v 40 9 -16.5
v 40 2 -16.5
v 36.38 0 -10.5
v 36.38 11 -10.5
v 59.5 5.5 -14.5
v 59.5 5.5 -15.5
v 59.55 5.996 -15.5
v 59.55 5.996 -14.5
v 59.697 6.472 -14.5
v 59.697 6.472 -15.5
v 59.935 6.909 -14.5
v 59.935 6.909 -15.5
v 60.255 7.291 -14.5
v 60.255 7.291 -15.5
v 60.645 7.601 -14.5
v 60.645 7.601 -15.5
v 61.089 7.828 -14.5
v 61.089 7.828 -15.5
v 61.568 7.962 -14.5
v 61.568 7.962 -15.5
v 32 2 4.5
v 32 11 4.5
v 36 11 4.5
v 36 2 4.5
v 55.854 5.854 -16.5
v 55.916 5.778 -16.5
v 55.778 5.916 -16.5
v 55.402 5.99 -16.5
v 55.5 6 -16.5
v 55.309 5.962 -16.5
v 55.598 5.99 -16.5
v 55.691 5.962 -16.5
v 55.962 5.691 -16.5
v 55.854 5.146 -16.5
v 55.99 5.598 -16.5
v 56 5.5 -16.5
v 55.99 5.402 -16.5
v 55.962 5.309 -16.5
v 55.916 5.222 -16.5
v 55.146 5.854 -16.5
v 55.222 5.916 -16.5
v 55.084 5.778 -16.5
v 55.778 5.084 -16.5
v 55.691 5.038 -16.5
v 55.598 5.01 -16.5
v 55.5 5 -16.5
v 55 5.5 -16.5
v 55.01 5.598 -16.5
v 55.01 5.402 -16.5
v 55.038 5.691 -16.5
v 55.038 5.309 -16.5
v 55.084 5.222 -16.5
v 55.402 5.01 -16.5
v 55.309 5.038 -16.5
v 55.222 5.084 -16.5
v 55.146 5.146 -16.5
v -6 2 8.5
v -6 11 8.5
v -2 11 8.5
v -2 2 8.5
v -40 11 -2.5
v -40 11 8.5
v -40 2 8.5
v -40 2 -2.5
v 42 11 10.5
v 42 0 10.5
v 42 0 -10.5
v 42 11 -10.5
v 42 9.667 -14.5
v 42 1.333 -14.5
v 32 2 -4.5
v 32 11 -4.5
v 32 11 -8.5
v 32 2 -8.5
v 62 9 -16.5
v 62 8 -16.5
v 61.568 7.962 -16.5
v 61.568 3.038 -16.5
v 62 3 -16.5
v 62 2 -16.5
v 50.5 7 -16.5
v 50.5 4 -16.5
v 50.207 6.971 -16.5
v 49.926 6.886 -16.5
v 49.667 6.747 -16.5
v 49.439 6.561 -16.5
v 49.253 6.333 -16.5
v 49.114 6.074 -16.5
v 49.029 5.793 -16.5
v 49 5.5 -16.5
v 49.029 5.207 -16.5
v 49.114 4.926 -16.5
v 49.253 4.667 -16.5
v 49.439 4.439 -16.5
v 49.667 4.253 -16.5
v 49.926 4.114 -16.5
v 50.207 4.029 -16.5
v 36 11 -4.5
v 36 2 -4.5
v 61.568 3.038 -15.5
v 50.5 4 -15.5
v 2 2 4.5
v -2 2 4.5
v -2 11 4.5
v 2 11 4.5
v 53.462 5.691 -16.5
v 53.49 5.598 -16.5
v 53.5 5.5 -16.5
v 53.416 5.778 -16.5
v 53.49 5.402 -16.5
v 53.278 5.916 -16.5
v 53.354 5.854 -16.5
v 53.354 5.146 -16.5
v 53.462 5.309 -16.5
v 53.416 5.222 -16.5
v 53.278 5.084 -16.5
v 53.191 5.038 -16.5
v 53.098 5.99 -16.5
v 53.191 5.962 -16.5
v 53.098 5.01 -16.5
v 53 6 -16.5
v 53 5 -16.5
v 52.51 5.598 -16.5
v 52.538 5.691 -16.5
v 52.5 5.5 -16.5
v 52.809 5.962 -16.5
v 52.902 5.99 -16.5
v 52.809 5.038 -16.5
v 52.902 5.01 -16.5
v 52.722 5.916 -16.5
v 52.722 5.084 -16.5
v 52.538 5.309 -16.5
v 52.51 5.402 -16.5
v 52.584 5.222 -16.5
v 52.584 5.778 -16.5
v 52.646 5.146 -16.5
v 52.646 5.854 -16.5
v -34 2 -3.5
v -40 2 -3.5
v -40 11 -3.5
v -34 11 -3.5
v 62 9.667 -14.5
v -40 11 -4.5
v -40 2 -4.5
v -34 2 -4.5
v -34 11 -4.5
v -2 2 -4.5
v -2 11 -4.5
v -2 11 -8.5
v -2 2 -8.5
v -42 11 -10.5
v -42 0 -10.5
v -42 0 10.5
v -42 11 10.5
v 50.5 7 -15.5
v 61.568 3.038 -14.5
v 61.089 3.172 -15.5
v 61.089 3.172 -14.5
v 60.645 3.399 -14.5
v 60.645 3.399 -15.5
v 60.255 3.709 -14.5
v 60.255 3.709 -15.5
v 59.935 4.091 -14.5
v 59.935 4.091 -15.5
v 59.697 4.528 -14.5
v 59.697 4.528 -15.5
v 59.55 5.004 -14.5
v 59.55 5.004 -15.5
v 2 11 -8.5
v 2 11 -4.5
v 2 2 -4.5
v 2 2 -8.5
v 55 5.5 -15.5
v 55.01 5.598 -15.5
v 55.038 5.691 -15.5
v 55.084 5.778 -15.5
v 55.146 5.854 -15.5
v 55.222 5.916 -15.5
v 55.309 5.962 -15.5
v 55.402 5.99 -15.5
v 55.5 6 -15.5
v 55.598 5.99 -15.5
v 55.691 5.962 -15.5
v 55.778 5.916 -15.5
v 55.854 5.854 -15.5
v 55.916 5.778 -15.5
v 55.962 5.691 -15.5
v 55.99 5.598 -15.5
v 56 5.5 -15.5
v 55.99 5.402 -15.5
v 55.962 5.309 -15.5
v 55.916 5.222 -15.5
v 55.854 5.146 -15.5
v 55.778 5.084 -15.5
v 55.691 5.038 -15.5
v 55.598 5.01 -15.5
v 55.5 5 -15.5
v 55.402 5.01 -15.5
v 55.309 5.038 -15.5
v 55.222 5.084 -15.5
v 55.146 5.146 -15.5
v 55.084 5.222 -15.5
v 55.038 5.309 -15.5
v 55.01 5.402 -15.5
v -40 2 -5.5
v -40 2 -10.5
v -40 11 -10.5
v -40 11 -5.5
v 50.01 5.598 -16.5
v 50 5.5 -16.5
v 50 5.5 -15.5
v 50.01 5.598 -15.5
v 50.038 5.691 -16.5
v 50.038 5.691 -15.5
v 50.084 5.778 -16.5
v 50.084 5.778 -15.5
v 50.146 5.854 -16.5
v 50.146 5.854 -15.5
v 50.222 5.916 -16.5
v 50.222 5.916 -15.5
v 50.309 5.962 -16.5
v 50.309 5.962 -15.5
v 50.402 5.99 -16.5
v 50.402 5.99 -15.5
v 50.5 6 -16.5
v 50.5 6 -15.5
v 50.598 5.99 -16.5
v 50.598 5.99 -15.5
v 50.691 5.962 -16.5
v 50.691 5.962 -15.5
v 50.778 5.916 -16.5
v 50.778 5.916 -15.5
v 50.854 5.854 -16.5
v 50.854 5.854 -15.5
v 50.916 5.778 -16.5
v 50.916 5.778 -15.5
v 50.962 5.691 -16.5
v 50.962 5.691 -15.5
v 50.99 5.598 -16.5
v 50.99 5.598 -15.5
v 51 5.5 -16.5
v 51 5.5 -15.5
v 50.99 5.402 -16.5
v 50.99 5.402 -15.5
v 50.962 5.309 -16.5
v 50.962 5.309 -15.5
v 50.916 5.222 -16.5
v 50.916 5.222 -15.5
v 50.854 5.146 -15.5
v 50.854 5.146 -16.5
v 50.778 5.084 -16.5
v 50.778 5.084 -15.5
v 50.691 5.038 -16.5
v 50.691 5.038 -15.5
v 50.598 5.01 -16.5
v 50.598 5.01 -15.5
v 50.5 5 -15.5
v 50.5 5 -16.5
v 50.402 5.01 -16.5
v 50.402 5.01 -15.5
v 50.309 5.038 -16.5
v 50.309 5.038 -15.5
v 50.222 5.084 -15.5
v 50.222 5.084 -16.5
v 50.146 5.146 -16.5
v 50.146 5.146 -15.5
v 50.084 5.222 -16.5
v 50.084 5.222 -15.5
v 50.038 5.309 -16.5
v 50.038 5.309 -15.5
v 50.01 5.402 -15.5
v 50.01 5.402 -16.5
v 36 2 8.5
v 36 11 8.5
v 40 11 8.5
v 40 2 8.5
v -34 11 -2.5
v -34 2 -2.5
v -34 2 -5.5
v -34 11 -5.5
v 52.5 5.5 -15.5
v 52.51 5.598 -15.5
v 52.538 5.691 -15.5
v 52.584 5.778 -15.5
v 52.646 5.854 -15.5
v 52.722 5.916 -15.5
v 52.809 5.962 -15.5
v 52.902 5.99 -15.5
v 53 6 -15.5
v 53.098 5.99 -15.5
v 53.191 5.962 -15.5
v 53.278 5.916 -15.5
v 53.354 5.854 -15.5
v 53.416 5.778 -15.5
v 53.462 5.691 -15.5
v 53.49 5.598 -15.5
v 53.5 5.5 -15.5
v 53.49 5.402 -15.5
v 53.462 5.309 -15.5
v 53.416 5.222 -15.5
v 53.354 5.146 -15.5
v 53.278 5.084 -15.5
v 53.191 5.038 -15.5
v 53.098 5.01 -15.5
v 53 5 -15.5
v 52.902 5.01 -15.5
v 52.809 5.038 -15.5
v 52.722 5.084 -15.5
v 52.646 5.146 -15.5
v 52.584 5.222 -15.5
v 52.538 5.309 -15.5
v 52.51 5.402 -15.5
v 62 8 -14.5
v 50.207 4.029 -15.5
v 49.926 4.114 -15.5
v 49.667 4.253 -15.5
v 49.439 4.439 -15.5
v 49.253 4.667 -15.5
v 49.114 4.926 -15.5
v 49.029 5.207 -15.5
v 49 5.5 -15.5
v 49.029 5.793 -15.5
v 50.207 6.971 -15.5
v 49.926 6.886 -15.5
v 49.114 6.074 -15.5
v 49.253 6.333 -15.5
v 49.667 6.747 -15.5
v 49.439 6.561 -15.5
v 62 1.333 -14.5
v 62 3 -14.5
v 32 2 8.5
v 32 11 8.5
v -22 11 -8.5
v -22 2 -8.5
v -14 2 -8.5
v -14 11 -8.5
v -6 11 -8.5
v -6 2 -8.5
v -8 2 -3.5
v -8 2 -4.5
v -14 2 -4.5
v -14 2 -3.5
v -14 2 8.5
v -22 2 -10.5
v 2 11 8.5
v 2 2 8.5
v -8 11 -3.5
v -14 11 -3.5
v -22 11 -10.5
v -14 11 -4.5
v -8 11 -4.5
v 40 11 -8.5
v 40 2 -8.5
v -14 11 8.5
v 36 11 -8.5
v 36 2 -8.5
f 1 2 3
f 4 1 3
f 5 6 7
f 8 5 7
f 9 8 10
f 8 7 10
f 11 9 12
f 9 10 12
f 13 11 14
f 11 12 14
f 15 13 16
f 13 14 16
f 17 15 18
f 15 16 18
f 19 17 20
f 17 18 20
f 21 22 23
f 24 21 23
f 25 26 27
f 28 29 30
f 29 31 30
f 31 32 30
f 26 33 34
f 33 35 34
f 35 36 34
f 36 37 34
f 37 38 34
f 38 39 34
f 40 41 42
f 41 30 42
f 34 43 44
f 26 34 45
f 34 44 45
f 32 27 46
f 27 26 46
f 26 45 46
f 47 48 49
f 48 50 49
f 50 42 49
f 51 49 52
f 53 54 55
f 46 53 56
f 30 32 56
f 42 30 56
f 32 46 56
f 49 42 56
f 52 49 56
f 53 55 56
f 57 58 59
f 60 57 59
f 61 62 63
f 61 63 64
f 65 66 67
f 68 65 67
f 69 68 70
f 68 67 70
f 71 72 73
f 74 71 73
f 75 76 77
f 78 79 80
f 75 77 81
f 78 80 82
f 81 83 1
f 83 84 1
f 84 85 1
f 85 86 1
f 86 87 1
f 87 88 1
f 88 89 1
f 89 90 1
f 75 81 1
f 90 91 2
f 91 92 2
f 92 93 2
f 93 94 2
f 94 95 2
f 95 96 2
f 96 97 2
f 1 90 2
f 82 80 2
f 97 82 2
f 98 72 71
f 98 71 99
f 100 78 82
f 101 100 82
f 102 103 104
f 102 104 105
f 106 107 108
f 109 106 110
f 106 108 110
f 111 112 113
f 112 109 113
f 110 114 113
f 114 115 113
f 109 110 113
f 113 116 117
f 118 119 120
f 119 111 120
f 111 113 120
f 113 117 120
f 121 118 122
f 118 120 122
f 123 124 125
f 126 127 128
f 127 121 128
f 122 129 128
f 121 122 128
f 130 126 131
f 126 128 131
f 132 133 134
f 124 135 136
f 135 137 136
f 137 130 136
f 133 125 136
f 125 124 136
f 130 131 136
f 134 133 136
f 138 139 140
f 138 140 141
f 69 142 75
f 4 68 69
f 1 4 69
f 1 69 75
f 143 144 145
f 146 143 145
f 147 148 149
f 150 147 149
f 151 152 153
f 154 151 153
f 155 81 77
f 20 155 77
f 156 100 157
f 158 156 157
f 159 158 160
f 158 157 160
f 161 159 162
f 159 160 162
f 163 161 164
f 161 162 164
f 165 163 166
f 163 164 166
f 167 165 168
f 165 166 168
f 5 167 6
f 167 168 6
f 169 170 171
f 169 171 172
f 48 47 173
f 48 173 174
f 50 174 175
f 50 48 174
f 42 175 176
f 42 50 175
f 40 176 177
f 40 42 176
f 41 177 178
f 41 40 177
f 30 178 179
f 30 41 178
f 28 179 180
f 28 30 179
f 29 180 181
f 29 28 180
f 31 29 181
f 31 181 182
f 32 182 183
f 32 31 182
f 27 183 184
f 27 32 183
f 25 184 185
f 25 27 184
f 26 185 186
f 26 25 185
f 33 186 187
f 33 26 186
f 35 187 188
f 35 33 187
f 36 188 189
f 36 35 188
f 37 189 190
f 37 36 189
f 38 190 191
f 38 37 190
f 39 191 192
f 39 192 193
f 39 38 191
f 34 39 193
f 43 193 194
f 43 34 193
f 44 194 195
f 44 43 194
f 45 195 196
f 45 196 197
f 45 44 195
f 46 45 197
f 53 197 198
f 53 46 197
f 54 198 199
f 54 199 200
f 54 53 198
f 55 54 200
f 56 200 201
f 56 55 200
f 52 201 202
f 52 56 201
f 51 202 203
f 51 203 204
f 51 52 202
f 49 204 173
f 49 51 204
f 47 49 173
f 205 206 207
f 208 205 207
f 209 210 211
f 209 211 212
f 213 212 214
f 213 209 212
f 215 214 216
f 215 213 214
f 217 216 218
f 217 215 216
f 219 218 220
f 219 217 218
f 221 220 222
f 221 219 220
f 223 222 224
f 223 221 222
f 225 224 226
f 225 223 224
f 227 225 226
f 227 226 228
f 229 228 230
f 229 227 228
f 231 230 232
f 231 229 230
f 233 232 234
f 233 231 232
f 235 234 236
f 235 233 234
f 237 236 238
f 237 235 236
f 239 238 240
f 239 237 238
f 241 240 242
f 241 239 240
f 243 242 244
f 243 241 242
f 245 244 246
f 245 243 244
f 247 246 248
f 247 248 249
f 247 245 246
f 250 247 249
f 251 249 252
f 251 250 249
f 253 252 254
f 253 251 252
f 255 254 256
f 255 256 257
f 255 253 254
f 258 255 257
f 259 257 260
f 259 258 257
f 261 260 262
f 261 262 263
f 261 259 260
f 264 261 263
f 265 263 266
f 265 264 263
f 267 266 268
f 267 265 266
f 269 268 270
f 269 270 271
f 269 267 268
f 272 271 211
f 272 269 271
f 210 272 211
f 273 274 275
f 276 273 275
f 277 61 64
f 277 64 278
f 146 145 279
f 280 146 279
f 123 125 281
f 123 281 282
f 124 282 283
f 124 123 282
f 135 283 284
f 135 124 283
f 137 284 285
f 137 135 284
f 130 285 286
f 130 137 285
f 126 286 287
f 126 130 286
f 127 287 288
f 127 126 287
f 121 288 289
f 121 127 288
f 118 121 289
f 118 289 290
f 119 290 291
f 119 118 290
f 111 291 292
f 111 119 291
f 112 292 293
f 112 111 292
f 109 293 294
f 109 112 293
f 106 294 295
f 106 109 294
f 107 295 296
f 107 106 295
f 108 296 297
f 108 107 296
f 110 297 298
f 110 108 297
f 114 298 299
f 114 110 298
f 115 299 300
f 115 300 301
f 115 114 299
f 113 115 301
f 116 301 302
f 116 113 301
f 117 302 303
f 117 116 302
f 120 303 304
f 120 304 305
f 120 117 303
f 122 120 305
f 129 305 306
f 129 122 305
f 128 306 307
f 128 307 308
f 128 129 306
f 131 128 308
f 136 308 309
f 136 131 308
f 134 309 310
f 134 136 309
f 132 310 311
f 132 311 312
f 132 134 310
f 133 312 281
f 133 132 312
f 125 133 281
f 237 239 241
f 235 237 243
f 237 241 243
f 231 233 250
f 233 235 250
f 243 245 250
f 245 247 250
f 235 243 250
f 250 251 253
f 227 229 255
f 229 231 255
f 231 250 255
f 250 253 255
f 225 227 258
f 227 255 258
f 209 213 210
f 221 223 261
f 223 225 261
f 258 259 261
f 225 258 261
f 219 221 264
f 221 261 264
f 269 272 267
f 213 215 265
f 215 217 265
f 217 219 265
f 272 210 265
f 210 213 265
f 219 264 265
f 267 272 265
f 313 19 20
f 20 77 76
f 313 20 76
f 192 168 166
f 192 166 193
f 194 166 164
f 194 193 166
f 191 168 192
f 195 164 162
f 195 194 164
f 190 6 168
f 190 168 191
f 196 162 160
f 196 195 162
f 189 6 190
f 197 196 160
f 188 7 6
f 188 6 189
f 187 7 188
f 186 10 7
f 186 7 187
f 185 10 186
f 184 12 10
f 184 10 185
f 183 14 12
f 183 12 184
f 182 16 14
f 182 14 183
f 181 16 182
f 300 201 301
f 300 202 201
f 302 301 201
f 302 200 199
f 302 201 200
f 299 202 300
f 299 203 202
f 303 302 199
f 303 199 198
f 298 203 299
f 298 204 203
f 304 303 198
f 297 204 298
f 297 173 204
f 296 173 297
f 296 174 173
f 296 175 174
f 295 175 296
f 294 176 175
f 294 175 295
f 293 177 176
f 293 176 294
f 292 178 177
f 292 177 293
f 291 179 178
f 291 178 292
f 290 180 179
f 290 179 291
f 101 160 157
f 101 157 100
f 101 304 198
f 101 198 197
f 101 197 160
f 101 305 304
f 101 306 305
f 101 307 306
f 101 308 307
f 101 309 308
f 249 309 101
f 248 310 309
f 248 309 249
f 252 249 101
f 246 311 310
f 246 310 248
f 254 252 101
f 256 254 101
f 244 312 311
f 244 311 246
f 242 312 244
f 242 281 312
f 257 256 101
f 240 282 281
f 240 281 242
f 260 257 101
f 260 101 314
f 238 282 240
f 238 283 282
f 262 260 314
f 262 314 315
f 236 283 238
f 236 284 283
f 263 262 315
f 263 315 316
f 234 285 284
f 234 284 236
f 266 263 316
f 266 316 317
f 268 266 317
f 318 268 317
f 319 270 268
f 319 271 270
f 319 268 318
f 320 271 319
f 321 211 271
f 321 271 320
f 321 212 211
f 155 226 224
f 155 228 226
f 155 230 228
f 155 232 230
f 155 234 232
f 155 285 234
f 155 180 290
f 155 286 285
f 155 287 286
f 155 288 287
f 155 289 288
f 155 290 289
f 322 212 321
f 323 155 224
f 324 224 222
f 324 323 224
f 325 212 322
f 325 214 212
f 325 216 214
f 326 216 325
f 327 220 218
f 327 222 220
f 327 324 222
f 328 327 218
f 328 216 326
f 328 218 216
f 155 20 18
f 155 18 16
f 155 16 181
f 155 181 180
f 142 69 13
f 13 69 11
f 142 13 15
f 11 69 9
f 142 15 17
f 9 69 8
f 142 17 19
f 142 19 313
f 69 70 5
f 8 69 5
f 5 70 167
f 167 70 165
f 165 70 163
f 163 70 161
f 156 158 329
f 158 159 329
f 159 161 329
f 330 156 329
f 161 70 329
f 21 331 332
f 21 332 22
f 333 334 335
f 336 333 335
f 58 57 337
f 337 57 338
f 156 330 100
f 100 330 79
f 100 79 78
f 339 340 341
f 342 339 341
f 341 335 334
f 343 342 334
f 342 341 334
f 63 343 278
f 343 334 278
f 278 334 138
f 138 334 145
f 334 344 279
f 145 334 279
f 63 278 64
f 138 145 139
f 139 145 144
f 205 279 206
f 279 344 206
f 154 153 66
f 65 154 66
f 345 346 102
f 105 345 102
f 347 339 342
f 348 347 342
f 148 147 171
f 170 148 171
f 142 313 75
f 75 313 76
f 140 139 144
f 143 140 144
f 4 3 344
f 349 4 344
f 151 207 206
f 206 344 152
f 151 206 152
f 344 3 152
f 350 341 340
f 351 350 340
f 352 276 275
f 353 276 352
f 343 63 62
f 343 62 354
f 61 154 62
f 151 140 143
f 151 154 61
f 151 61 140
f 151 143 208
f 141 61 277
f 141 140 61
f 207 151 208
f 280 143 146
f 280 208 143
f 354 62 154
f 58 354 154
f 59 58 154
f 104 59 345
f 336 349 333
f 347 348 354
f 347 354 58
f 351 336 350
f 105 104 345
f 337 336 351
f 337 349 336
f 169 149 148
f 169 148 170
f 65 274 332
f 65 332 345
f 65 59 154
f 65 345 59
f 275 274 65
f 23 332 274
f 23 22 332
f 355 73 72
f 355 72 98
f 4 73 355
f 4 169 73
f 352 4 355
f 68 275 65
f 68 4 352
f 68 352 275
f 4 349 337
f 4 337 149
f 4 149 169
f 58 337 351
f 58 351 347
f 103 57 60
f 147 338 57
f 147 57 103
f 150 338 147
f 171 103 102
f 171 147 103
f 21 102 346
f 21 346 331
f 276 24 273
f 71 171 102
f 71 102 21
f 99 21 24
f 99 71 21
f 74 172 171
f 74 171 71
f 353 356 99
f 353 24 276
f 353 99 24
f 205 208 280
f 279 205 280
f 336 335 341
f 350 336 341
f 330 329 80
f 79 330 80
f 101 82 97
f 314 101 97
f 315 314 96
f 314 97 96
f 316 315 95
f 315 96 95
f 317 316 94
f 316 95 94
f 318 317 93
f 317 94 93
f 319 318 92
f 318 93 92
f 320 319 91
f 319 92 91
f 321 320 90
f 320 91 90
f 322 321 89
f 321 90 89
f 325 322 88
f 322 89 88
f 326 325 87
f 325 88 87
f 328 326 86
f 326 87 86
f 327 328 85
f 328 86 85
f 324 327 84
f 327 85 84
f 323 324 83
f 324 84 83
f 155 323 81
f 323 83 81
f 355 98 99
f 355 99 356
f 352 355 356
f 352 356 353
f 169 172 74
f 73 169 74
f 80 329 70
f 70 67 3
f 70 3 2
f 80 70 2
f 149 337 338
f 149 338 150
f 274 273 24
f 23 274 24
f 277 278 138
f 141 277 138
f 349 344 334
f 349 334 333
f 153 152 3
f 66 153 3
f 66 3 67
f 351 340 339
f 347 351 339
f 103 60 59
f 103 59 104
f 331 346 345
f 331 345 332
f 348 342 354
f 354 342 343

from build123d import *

# Parameters (mm, degrees)
BOSS_EXTRUDE1_DEPTH     = 2
SKETCH1_4_W             = 46
SKETCH1_4_H             = 17
BOSS_EXTRUDE2_DEPTH     = 11
SKETCH2_W               = 6
SKETCH2_H               = 3
SKETCH2_H_2             = 11
CUT_EXTRUDE1_DEPTH      = 9
SKETCH3_W               = 18
SKETCH3_H               = 9
CUT_EXTRUDE2_DEPTH      = 2
SKETCH4_W               = 4
SKETCH4_H               = 4
BOSS_EXTRUDE3_DEPTH     = 9
SKETCH6_R               = 0.5
CUT_EXTRUDE3_DEPTH      = 1
CUT_EXTRUDE4_DEPTH      = 2
CUT_EXTRUDE5_DEPTH      = 34
CUT_EXTRUDE5_DEPTH_BACK = 13


with BuildPart() as part:
    # Sketch1 → Boss-Extrude1 (new body)
    with BuildSketch(Plane(origin=(0, 0, 0), x_dir=(1, 0, 0), z_dir=(0, 1, 0))):
        Polygon((-42, 10.5), (-42, -10.5), (42, -10.5), (42, 14.5), (62, 14.5), (62, 16.5), (40, 16.5), (36.380121198, 10.5), align=None)
    extrude(amount=BOSS_EXTRUDE1_DEPTH)

    # Sketch1<4> → Boss-Extrude2 (add)
    with BuildSketch(Plane(origin=(0, 0, 0), x_dir=(1, 0, 0), z_dir=(0, 1, 0))):
        Polygon((-42, 10.5), (-42, -10.5), (42, -10.5), (42, 14.5), (62, 14.5), (62, 16.5), (40, 16.5), (36.380121198, 10.5), align=None)
        Polygon((-14, 3.5), (-14, -8.5), (-34, -8.5), (-34, 3.5), (-40, 3.5), (-40, 4.5), (-34, 4.5), (-34, 8.5), (-14, 8.5), (-14, 4.5), (-8, 4.5), (-8, 3.5), align=None, mode=Mode.SUBTRACT)
        with Locations((17, 0)):
            Rectangle(SKETCH1_4_W, SKETCH1_4_H, mode=Mode.SUBTRACT)
    extrude(amount=BOSS_EXTRUDE2_DEPTH)

    # Sketch2 → Cut-Extrude1 (cut)
    with BuildSketch(Plane(origin=(0, 11, 0), x_dir=(1, 0, 0), z_dir=(0, 1, 0))):
        with Locations((-37, 7)):
            Rectangle(SKETCH2_W, SKETCH2_H)
        with Locations((-37, -3)):
            Rectangle(SKETCH2_W, SKETCH2_H_2)
    extrude(amount=-CUT_EXTRUDE1_DEPTH, mode=Mode.SUBTRACT)

    # Sketch3 → Cut-Extrude2 (cut)
    with BuildSketch(Plane(origin=(0, 0, -10.5), x_dir=(-1, 0, 0), z_dir=(0, 0, -1))):
        with Locations((31, 6.5)):
            Rectangle(SKETCH3_W, SKETCH3_H)
    extrude(amount=-CUT_EXTRUDE2_DEPTH, mode=Mode.SUBTRACT)

    # Sketch4 → Boss-Extrude3 (add)
    with BuildSketch(Plane(origin=(0, 2, 0), x_dir=(1, 0, 0), z_dir=(0, 1, 0))):
        with Locations((0, 6.5)):
            Rectangle(SKETCH4_W, SKETCH4_H)
        with Locations((0, -6.5)):
            Rectangle(SKETCH4_W, SKETCH4_H)
        with Locations((34, 6.5)):
            Rectangle(SKETCH4_W, SKETCH4_H)
        with Locations((34, -6.5)):
            Rectangle(SKETCH4_W, SKETCH4_H)
    extrude(amount=BOSS_EXTRUDE3_DEPTH)

    # Sketch6 → Cut-Extrude3 (cut)
    with BuildSketch(Plane(origin=(0, 0, -16.5), x_dir=(-1, 0, 0), z_dir=(0, 0, -1))):
        with BuildLine():
            Line((-61.5684803, 3.037523452), (-50.5, 4))
            ThreePointArc((-50.5, 4), (-49, 5.5), (-50.5, 7))
            Line((-50.5, 7), (-61.5684803, 7.962476548))
            ThreePointArc((-61.5684803, 7.962476548), (-59.5, 5.5), (-61.5684803, 3.037523452))
        make_face()
        with Locations((-55.5, 5.5)):
            Circle(SKETCH6_R, mode=Mode.SUBTRACT)
        with Locations((-53, 5.5)):
            Circle(SKETCH6_R, mode=Mode.SUBTRACT)
        with Locations((-50.5, 5.5)):
            Circle(SKETCH6_R, mode=Mode.SUBTRACT)
    extrude(amount=-CUT_EXTRUDE3_DEPTH, mode=Mode.SUBTRACT)

    # Sketch6<3> → Cut-Extrude4 (cut)
    with BuildSketch(Plane(origin=(0, 0, -16.5), x_dir=(-1, 0, 0), z_dir=(0, 0, -1))):
        with BuildLine():
            Line((-62, 8), (-62, 3))
            Line((-62, 3), (-61.5684803, 3.037523452))
            ThreePointArc((-61.5684803, 3.037523452), (-60.085737838, 3.892019784), (-59.5, 5.5))
            ThreePointArc((-59.5, 5.5), (-60.085737838, 7.107980216), (-61.5684803, 7.962476548))
            Line((-61.5684803, 7.962476548), (-62, 8))
        make_face()
    extrude(amount=-CUT_EXTRUDE4_DEPTH, mode=Mode.SUBTRACT)

    # Sketch7 → Cut-Extrude5 (cut, two sides: drawn at the far end of the back side and taken through both)
    with BuildSketch(Plane(origin=(42, 0, 0), x_dir=(0, 0, -1), z_dir=(1, 0, 0)).offset(-CUT_EXTRUDE5_DEPTH_BACK)):
        Polygon((10.5, 0), (16.5, 2), (16.5, 0), align=None)
        Polygon((10.5, 11), (16.5, 9), (16.5, 11), align=None)
    extrude(amount=CUT_EXTRUDE5_DEPTH + CUT_EXTRUDE5_DEPTH_BACK, mode=Mode.SUBTRACT)


solid = part.part
